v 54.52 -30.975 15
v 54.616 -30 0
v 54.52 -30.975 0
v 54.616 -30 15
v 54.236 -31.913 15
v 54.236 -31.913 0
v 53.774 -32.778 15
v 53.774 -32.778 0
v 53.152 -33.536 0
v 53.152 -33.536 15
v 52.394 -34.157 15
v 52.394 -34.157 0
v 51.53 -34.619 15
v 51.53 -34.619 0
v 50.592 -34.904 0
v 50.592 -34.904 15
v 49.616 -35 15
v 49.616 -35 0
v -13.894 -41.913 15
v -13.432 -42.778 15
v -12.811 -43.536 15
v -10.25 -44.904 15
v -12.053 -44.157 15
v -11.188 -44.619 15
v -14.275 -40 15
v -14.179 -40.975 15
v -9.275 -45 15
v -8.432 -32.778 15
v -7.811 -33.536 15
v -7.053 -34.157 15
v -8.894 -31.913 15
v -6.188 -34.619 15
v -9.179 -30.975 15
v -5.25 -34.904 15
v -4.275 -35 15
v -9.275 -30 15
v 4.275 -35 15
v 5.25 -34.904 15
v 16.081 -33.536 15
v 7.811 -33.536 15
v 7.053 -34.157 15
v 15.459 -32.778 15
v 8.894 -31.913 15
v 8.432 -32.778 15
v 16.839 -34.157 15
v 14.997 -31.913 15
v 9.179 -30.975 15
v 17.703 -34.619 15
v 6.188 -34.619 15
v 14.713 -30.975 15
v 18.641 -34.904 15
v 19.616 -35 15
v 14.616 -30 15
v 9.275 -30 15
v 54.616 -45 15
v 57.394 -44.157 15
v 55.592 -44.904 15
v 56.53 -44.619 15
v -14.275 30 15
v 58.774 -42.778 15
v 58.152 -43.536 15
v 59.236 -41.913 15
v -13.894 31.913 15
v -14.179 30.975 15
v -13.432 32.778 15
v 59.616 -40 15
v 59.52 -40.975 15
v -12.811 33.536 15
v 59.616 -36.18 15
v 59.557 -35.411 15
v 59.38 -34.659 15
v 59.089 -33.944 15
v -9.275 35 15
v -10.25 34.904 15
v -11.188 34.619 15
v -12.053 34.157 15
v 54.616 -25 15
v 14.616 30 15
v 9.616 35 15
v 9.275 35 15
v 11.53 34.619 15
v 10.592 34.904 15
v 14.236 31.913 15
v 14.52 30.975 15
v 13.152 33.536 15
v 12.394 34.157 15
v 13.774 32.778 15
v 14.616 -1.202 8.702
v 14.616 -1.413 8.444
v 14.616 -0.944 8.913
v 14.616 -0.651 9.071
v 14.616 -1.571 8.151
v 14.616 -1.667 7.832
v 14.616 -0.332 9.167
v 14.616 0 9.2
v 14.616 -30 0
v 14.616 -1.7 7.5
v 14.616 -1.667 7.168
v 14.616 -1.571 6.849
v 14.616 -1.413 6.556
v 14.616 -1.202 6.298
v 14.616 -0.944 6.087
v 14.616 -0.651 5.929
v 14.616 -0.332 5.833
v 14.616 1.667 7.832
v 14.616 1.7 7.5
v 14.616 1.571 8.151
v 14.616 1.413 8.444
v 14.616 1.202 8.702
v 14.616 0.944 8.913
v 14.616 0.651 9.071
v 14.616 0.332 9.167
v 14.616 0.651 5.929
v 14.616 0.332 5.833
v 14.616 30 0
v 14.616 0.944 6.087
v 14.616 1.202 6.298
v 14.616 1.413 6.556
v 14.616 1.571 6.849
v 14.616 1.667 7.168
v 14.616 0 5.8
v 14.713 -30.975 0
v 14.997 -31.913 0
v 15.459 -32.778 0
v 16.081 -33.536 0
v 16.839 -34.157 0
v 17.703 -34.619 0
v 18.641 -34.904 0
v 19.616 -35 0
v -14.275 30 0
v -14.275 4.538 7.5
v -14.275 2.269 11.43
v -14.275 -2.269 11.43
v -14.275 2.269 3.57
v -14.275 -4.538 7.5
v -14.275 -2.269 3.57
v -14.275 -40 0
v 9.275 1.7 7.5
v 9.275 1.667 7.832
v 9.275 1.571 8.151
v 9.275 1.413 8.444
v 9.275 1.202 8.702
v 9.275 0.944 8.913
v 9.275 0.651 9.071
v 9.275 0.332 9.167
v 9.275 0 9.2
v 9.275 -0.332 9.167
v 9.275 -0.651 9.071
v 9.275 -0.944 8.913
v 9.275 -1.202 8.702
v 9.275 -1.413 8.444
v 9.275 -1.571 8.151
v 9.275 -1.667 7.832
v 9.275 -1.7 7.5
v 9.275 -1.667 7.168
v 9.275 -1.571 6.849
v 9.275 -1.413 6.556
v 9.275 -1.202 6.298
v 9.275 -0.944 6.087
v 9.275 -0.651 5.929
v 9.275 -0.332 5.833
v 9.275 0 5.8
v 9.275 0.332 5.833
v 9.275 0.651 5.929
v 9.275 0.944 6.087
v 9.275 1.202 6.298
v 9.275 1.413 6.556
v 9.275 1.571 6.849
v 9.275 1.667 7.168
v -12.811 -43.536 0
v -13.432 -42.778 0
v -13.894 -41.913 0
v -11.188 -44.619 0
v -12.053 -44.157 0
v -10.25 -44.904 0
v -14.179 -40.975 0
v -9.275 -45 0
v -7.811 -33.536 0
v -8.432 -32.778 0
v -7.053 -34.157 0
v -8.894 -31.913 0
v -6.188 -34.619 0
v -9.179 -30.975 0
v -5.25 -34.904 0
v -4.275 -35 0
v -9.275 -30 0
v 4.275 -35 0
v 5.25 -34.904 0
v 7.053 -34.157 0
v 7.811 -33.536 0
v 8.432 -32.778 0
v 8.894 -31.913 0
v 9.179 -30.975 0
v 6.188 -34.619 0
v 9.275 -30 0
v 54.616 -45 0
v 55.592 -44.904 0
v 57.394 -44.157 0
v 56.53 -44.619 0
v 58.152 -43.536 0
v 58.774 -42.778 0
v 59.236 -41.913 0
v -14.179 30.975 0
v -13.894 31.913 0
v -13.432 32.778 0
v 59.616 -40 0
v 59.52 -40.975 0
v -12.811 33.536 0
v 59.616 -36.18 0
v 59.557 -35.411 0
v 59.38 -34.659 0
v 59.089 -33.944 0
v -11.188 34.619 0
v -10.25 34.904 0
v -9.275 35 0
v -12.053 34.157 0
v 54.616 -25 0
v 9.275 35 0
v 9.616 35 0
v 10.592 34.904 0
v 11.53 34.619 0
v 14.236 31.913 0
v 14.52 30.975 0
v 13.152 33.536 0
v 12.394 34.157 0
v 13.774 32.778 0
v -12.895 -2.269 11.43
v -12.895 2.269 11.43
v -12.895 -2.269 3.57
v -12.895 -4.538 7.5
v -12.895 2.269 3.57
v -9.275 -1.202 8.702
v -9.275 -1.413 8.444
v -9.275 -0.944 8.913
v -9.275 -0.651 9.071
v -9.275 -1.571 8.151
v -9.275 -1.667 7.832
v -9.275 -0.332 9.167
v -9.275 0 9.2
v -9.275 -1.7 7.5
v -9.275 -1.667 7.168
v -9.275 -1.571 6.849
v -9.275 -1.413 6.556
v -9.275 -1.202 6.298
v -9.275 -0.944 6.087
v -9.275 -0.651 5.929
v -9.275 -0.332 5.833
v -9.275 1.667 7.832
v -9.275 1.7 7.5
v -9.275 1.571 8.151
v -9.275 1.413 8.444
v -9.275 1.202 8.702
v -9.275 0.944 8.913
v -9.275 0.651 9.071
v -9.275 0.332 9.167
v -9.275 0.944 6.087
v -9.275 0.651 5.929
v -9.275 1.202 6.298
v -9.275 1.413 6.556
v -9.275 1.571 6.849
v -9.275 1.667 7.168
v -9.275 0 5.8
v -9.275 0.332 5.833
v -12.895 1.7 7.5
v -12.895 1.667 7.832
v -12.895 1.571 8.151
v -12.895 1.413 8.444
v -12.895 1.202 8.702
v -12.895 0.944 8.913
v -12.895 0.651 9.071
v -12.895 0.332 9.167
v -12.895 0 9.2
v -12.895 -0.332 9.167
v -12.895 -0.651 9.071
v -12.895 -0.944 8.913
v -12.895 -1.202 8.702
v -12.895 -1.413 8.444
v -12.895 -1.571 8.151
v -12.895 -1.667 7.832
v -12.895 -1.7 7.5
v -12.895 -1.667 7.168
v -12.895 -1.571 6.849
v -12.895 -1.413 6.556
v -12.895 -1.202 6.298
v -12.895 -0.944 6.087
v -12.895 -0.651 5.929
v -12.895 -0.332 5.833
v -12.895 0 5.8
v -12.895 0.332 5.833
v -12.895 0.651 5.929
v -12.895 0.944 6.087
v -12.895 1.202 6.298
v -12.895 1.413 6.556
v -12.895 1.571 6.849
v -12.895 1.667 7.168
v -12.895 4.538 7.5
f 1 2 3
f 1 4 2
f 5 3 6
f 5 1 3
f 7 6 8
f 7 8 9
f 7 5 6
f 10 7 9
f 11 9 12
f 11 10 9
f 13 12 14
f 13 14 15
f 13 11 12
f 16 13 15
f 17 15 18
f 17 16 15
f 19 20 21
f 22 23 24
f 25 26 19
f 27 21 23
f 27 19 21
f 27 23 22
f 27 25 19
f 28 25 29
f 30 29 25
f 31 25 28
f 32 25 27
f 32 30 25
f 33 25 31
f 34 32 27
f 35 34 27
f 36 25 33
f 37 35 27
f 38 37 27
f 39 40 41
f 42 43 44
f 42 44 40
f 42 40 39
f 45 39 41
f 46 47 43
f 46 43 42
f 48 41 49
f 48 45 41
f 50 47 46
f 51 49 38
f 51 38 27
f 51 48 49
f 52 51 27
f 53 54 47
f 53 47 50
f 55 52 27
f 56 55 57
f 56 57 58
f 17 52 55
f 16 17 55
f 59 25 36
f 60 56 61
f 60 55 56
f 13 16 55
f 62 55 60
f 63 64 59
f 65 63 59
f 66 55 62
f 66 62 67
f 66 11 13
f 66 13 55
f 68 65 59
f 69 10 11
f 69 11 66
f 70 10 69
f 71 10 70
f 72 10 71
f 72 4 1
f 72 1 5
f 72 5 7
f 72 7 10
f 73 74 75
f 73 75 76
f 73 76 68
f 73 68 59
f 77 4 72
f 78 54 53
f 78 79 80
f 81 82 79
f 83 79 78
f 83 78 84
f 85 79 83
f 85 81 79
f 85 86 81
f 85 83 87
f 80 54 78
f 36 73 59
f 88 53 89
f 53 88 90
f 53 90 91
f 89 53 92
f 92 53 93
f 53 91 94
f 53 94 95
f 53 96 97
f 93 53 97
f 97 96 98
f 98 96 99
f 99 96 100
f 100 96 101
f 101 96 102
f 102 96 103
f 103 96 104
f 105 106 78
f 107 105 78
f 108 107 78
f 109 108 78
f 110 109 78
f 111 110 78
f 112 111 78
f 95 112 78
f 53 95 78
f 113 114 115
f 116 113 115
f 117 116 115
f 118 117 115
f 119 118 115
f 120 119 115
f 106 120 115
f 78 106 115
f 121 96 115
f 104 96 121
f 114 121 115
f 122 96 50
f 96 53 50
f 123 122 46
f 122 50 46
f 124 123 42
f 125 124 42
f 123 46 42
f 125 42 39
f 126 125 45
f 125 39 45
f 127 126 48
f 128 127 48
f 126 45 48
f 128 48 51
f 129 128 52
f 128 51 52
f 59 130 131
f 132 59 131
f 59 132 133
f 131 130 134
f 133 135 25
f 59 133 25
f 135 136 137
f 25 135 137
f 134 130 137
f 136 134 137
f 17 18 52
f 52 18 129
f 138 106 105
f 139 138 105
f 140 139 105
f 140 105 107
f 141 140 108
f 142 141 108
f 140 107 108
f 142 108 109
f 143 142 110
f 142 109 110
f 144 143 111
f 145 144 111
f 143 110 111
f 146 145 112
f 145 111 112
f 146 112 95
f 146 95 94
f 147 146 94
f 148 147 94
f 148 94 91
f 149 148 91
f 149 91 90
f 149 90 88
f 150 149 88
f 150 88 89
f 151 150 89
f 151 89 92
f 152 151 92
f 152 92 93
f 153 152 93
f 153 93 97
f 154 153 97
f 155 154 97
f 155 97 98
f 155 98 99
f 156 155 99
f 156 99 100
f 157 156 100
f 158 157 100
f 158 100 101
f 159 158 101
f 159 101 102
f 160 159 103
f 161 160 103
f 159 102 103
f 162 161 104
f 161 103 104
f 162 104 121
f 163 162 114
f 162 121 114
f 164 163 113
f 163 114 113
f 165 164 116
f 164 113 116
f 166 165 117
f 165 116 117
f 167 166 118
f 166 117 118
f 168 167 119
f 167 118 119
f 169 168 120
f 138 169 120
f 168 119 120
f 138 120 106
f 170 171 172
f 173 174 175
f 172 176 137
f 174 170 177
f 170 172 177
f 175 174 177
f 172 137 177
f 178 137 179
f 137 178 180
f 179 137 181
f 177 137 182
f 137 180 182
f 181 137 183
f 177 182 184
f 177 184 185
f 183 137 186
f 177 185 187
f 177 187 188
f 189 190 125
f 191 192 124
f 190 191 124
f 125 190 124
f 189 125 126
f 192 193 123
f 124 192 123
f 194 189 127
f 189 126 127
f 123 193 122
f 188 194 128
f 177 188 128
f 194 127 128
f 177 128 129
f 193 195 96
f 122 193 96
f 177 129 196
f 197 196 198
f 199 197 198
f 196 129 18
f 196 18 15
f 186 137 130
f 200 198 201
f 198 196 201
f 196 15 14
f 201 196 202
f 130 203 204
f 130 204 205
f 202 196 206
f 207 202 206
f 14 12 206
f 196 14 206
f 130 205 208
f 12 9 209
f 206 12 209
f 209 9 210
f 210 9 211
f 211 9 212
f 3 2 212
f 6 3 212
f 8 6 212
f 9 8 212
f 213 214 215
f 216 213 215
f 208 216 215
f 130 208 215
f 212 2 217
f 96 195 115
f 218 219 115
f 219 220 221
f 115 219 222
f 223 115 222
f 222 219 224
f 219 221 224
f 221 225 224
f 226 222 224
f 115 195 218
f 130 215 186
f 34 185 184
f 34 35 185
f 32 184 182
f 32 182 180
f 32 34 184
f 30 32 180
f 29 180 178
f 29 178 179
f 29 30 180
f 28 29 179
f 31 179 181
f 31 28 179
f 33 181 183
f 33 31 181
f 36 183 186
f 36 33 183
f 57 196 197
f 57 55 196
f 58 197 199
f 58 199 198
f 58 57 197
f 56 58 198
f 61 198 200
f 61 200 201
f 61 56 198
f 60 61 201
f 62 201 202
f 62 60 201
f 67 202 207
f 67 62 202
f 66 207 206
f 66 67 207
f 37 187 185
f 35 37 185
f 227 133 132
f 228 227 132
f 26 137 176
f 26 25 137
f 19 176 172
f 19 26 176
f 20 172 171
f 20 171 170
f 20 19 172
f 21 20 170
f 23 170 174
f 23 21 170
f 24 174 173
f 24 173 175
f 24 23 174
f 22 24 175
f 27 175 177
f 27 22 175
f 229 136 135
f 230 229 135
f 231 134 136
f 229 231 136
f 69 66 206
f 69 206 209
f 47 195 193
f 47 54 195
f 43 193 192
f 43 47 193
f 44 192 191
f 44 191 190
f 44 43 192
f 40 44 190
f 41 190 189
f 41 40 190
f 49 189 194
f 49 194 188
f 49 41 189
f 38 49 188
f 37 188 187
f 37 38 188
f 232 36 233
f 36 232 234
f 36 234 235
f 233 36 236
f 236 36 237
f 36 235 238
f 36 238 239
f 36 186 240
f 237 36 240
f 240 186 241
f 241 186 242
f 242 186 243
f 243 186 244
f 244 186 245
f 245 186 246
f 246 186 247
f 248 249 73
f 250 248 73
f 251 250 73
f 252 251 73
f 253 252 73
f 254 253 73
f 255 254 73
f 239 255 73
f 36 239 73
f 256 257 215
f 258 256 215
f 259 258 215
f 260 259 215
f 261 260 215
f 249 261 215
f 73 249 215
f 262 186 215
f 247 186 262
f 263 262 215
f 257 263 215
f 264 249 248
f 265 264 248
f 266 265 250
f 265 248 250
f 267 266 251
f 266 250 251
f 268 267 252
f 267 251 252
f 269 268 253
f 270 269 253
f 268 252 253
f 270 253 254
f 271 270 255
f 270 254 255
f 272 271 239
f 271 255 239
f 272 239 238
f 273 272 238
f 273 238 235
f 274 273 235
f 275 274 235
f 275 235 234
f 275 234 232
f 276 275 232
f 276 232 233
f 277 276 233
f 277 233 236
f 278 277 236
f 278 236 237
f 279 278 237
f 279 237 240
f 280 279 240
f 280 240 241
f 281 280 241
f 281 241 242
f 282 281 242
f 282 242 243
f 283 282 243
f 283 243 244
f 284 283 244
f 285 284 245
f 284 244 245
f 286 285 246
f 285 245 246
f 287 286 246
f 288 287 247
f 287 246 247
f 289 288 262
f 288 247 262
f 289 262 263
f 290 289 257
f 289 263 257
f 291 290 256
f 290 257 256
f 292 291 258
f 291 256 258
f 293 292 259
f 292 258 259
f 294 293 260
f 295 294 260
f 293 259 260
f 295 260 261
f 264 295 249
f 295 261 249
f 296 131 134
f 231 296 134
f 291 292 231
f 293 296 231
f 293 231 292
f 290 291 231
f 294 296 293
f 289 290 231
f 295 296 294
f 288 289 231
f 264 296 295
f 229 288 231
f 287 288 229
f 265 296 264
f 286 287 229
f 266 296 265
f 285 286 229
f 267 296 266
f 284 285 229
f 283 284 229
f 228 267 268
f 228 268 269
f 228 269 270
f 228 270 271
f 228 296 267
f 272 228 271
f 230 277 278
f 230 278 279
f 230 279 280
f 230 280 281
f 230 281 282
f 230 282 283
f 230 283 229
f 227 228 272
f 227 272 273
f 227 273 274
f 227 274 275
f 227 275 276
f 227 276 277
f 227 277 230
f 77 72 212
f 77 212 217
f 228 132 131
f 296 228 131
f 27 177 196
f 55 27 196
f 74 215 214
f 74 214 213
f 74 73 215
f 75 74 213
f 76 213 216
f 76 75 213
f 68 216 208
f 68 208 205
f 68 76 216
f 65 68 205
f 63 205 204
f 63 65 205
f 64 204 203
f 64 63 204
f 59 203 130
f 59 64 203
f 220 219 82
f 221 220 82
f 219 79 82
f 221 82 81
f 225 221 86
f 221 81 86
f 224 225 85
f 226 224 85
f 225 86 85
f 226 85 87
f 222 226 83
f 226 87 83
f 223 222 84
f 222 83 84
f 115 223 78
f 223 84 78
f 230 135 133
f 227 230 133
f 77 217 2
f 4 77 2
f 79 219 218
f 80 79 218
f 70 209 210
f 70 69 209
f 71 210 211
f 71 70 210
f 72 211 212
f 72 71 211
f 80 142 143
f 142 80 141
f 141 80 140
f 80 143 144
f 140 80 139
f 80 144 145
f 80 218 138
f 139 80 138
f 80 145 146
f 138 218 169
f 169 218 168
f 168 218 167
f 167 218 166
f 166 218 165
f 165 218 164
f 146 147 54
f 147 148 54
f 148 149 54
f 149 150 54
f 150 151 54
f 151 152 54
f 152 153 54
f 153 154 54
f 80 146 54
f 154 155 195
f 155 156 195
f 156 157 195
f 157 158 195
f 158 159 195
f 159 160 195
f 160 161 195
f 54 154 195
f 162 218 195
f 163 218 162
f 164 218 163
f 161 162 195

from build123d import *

# Parameters (mm, degrees)
F1_DEPTH = 15
F2_R     = 1.7
F3_DEPTH = 28.8924828911
F5_DEPTH = 1.38
F6_R     = 4.99999


# Not quite as in the source:
# - a fillet or chamfer is up to 0.001 mm smaller than in the source, because OpenCascade refuses the exact size


with BuildPart() as f1:
    # F0 (on Top) → F1 (new body)
    with BuildSketch(Plane.XY):
        Polygon((9.275, 35), (9.275, -35), (-9.275, -35), (-9.275, 35), (-14.275, 35), (-14.275, -35), (-14.275, -45), (59.6164828911, -45), (59.6164828911, -35), (54.6164828911, -25), (54.6164828911, -35), (14.6164828911, -35), (14.6164828911, 35), align=None)
    extrude(amount=F1_DEPTH)

    # F2 (on face) → F3 (cut, through all)
    with BuildSketch(Plane.YZ.offset(14.6164828911)):
        with Locations((0, 7.5)):
            Circle(F2_R)
    extrude(amount=-F3_DEPTH, mode=Mode.SUBTRACT)

    # F4 (on face) → F5 (cut)
    with BuildSketch(Plane(origin=(-14.275, 0, 0), x_dir=(0, -1, 0), z_dir=(-1, 0, 0))):
        Polygon((-2.2689865579, 3.57), (2.2689865579, 3.57), (4.5379731158, 7.5), (2.2689865579, 11.43), (-2.2689865579, 11.43), (-4.5379731158, 7.5), align=None)
    extrude(amount=-F5_DEPTH, mode=Mode.SUBTRACT)

    # F6 (radius 5 in the source; OpenCascade refuses exactly that, so slightly less here)
    f6_edges = [f1.edges().sort_by_distance(p)[0] for p in [
        (-9.275, -35, 7.5),
        (9.275, -35, 7.5),
        (-14.275, -45, 7.5),
        (59.616483, -45, 7.5),
        (54.616483, -35, 7.5),
        (14.616483, -35, 7.5),
        (59.616483, -35, 7.5),
        (14.616483, 35, 7.5),
        (-14.275, 35, 7.5),
    ]]
    fillet(f6_edges, radius=F6_R)


solid = f1.part
